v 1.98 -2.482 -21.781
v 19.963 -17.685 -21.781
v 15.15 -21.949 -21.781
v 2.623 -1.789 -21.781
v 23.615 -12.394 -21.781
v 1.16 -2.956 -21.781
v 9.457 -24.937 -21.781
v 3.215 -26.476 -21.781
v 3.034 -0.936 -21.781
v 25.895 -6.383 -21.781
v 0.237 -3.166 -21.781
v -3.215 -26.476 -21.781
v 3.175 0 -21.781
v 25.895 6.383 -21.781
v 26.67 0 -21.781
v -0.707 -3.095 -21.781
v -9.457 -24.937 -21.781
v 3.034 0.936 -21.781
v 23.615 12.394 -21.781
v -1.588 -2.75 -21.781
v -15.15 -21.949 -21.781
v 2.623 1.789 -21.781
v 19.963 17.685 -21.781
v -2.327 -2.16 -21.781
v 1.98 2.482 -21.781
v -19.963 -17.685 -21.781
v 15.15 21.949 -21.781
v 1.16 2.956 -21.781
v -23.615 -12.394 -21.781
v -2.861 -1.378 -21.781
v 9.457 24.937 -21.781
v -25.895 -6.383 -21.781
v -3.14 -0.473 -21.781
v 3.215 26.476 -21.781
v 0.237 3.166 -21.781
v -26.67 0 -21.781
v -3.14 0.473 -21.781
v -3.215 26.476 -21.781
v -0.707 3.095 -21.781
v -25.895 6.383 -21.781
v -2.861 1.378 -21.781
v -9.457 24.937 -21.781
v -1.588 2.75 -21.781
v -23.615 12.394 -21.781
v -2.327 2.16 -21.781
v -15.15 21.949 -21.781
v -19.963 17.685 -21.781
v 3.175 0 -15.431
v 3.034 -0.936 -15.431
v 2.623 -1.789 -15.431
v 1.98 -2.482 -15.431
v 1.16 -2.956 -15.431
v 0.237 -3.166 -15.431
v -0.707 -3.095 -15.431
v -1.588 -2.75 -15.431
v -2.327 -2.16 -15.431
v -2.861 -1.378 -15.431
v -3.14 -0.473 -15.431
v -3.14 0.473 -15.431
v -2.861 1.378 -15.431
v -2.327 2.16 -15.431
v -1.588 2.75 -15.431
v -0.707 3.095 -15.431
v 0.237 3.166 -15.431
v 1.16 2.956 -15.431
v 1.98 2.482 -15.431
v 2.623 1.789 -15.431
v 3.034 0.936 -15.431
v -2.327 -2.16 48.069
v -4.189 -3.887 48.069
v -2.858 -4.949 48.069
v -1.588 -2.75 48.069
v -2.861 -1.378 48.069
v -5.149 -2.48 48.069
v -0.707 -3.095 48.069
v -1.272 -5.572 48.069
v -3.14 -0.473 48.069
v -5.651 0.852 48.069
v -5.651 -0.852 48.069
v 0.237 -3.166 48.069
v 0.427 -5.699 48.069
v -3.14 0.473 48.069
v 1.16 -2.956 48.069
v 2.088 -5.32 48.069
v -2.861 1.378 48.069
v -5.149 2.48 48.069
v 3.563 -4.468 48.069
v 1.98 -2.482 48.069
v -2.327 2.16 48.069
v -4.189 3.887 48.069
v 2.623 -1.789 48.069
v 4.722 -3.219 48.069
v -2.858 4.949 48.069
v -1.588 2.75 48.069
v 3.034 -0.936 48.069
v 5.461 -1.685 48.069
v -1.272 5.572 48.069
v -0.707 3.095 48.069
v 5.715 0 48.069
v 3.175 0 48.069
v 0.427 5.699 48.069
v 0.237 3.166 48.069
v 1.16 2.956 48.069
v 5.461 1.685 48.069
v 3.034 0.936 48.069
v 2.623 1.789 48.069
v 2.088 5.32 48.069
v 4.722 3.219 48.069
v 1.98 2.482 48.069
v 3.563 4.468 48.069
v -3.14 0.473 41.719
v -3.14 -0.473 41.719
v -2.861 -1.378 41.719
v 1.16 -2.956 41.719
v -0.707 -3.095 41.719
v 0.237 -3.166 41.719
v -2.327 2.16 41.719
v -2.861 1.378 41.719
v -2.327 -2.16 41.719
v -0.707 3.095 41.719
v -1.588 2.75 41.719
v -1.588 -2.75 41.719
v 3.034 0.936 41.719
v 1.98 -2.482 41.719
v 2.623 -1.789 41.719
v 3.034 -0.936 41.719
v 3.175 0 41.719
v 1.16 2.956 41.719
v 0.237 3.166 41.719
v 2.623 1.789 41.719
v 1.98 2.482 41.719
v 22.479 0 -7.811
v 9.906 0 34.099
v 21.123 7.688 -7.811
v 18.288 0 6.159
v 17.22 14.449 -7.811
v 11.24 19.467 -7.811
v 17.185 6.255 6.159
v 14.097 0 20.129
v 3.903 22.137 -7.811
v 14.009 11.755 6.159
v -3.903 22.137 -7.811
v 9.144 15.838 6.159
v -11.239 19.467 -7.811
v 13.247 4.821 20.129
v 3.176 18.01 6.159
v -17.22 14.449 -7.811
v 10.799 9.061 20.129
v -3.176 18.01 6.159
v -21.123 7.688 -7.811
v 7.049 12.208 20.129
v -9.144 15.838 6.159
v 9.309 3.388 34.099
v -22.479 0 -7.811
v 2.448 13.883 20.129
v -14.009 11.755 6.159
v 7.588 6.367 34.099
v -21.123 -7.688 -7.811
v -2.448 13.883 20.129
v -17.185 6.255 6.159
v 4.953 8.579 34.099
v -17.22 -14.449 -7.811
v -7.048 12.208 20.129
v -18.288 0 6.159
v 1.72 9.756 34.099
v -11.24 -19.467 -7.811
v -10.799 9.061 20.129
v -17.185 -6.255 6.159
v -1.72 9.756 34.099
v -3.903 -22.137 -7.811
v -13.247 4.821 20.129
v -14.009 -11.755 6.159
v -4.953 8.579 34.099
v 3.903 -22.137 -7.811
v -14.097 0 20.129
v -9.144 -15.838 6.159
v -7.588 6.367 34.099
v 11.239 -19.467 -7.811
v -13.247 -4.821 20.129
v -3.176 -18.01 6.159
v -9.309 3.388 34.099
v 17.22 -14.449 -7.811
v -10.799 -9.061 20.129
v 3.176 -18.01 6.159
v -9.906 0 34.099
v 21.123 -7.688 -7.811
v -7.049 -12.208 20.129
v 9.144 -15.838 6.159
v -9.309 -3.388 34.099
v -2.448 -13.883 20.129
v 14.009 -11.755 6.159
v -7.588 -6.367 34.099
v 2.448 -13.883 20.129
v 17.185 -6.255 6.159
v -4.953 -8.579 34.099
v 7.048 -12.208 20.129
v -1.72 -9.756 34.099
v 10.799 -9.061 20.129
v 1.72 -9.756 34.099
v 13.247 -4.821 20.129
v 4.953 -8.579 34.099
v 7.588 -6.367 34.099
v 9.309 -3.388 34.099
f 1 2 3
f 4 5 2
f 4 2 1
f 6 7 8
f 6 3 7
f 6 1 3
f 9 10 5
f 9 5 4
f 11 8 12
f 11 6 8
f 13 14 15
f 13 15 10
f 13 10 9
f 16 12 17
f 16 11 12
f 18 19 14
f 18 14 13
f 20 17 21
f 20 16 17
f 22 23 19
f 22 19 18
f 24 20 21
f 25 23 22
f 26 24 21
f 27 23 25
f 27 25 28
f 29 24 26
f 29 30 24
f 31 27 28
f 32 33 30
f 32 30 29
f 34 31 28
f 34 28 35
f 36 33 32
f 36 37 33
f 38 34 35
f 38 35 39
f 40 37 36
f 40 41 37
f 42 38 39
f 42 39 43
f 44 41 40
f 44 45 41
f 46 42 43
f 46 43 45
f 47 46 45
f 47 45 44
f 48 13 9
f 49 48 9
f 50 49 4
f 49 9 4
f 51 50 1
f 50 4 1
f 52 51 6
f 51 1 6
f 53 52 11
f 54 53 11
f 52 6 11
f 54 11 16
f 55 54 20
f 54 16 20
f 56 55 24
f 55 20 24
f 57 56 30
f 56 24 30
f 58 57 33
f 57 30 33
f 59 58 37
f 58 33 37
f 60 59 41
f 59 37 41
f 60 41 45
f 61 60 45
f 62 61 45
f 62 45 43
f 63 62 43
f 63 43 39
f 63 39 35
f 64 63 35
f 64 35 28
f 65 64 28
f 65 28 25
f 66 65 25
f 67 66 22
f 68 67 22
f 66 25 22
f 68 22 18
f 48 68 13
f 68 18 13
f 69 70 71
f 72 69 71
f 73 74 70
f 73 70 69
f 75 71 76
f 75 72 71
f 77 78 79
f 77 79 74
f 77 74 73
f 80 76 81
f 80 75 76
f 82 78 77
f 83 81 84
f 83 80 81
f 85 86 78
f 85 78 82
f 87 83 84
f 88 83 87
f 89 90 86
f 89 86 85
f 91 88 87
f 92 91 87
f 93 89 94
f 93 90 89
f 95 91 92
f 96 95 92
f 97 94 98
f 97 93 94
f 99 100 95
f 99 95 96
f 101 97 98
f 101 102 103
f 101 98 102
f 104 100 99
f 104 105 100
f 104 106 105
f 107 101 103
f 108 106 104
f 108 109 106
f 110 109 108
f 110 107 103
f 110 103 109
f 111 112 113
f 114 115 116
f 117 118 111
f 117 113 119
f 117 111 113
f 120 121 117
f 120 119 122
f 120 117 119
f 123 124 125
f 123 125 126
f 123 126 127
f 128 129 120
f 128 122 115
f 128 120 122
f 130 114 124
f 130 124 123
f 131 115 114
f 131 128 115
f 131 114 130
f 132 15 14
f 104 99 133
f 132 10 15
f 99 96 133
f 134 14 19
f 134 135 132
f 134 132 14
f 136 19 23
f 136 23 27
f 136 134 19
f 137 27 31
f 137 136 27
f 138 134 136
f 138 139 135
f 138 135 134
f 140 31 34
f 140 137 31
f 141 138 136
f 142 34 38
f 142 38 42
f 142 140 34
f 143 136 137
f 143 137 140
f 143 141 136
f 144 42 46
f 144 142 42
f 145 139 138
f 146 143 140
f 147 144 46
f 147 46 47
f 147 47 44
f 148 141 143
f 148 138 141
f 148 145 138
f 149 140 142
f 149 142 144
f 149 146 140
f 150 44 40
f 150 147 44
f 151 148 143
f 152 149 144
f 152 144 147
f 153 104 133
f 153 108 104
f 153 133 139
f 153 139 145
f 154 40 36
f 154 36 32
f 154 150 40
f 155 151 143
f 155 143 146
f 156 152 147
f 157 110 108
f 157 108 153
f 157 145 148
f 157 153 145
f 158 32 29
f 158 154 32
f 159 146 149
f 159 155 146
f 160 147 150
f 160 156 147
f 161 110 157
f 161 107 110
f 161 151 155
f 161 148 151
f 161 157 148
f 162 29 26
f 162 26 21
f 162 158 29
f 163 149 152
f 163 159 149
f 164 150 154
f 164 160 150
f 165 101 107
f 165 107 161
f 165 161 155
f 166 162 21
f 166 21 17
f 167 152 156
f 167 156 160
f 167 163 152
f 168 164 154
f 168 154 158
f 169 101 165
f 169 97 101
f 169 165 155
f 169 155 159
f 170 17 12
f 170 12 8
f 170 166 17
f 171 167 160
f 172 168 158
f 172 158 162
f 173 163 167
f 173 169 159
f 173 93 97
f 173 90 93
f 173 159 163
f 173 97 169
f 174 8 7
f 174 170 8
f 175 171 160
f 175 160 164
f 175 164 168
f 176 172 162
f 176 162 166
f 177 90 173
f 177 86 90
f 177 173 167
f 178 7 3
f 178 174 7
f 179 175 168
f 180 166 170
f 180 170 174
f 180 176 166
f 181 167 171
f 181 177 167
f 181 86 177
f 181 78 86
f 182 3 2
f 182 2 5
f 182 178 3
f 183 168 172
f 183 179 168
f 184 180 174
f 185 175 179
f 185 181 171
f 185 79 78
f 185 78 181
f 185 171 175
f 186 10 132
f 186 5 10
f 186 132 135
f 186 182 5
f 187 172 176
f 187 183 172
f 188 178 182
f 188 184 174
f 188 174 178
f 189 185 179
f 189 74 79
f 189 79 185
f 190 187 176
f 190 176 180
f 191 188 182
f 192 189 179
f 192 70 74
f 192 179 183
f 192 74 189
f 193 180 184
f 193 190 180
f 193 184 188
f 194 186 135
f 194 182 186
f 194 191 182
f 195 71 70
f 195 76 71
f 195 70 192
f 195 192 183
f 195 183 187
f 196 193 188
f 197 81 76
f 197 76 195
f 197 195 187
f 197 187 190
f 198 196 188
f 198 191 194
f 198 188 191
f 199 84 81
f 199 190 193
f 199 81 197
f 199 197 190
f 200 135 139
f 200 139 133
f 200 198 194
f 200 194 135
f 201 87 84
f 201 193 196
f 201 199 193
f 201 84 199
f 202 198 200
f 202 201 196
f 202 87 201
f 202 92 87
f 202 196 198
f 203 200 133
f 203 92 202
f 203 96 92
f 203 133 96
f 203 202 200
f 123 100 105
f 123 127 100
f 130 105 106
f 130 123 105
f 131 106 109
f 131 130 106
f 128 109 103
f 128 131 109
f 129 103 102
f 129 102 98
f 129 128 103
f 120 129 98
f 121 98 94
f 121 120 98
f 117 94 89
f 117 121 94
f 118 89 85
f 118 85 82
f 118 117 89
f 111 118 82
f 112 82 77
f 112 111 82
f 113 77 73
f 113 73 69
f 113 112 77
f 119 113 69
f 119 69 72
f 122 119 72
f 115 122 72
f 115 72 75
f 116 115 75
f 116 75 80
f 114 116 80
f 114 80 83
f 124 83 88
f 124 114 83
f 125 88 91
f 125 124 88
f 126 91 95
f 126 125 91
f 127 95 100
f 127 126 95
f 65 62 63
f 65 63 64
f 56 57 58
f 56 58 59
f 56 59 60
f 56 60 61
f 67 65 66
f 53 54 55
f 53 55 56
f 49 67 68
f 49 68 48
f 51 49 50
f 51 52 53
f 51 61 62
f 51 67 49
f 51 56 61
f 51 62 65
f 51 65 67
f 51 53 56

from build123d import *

# Parameters (mm, degrees)
F2_R     = 3.175
F3_DEPTH = 6.35


with BuildPart() as f1:
    # F0 (on Front) → F1 (revolve)
    with BuildSketch(Plane.XZ):
        Polygon((26.67, -21.780774), (5.715, 48.069226), (3.175, 48.069226), (3.175, 41.719226), (0, 41.719226), (0, -21.780774), align=None)
    revolve(axis=Axis((0, 0, 9.969226), (0, 0, 1)))

    # F2 (on face) → F3 (cut)
    with BuildSketch(Plane(origin=(0, 0, -21.780774), x_dir=(1, 0, 0), z_dir=(0, 0, -1))):
        Circle(F2_R)
    extrude(amount=-F3_DEPTH, mode=Mode.SUBTRACT)


solid = f1.part
